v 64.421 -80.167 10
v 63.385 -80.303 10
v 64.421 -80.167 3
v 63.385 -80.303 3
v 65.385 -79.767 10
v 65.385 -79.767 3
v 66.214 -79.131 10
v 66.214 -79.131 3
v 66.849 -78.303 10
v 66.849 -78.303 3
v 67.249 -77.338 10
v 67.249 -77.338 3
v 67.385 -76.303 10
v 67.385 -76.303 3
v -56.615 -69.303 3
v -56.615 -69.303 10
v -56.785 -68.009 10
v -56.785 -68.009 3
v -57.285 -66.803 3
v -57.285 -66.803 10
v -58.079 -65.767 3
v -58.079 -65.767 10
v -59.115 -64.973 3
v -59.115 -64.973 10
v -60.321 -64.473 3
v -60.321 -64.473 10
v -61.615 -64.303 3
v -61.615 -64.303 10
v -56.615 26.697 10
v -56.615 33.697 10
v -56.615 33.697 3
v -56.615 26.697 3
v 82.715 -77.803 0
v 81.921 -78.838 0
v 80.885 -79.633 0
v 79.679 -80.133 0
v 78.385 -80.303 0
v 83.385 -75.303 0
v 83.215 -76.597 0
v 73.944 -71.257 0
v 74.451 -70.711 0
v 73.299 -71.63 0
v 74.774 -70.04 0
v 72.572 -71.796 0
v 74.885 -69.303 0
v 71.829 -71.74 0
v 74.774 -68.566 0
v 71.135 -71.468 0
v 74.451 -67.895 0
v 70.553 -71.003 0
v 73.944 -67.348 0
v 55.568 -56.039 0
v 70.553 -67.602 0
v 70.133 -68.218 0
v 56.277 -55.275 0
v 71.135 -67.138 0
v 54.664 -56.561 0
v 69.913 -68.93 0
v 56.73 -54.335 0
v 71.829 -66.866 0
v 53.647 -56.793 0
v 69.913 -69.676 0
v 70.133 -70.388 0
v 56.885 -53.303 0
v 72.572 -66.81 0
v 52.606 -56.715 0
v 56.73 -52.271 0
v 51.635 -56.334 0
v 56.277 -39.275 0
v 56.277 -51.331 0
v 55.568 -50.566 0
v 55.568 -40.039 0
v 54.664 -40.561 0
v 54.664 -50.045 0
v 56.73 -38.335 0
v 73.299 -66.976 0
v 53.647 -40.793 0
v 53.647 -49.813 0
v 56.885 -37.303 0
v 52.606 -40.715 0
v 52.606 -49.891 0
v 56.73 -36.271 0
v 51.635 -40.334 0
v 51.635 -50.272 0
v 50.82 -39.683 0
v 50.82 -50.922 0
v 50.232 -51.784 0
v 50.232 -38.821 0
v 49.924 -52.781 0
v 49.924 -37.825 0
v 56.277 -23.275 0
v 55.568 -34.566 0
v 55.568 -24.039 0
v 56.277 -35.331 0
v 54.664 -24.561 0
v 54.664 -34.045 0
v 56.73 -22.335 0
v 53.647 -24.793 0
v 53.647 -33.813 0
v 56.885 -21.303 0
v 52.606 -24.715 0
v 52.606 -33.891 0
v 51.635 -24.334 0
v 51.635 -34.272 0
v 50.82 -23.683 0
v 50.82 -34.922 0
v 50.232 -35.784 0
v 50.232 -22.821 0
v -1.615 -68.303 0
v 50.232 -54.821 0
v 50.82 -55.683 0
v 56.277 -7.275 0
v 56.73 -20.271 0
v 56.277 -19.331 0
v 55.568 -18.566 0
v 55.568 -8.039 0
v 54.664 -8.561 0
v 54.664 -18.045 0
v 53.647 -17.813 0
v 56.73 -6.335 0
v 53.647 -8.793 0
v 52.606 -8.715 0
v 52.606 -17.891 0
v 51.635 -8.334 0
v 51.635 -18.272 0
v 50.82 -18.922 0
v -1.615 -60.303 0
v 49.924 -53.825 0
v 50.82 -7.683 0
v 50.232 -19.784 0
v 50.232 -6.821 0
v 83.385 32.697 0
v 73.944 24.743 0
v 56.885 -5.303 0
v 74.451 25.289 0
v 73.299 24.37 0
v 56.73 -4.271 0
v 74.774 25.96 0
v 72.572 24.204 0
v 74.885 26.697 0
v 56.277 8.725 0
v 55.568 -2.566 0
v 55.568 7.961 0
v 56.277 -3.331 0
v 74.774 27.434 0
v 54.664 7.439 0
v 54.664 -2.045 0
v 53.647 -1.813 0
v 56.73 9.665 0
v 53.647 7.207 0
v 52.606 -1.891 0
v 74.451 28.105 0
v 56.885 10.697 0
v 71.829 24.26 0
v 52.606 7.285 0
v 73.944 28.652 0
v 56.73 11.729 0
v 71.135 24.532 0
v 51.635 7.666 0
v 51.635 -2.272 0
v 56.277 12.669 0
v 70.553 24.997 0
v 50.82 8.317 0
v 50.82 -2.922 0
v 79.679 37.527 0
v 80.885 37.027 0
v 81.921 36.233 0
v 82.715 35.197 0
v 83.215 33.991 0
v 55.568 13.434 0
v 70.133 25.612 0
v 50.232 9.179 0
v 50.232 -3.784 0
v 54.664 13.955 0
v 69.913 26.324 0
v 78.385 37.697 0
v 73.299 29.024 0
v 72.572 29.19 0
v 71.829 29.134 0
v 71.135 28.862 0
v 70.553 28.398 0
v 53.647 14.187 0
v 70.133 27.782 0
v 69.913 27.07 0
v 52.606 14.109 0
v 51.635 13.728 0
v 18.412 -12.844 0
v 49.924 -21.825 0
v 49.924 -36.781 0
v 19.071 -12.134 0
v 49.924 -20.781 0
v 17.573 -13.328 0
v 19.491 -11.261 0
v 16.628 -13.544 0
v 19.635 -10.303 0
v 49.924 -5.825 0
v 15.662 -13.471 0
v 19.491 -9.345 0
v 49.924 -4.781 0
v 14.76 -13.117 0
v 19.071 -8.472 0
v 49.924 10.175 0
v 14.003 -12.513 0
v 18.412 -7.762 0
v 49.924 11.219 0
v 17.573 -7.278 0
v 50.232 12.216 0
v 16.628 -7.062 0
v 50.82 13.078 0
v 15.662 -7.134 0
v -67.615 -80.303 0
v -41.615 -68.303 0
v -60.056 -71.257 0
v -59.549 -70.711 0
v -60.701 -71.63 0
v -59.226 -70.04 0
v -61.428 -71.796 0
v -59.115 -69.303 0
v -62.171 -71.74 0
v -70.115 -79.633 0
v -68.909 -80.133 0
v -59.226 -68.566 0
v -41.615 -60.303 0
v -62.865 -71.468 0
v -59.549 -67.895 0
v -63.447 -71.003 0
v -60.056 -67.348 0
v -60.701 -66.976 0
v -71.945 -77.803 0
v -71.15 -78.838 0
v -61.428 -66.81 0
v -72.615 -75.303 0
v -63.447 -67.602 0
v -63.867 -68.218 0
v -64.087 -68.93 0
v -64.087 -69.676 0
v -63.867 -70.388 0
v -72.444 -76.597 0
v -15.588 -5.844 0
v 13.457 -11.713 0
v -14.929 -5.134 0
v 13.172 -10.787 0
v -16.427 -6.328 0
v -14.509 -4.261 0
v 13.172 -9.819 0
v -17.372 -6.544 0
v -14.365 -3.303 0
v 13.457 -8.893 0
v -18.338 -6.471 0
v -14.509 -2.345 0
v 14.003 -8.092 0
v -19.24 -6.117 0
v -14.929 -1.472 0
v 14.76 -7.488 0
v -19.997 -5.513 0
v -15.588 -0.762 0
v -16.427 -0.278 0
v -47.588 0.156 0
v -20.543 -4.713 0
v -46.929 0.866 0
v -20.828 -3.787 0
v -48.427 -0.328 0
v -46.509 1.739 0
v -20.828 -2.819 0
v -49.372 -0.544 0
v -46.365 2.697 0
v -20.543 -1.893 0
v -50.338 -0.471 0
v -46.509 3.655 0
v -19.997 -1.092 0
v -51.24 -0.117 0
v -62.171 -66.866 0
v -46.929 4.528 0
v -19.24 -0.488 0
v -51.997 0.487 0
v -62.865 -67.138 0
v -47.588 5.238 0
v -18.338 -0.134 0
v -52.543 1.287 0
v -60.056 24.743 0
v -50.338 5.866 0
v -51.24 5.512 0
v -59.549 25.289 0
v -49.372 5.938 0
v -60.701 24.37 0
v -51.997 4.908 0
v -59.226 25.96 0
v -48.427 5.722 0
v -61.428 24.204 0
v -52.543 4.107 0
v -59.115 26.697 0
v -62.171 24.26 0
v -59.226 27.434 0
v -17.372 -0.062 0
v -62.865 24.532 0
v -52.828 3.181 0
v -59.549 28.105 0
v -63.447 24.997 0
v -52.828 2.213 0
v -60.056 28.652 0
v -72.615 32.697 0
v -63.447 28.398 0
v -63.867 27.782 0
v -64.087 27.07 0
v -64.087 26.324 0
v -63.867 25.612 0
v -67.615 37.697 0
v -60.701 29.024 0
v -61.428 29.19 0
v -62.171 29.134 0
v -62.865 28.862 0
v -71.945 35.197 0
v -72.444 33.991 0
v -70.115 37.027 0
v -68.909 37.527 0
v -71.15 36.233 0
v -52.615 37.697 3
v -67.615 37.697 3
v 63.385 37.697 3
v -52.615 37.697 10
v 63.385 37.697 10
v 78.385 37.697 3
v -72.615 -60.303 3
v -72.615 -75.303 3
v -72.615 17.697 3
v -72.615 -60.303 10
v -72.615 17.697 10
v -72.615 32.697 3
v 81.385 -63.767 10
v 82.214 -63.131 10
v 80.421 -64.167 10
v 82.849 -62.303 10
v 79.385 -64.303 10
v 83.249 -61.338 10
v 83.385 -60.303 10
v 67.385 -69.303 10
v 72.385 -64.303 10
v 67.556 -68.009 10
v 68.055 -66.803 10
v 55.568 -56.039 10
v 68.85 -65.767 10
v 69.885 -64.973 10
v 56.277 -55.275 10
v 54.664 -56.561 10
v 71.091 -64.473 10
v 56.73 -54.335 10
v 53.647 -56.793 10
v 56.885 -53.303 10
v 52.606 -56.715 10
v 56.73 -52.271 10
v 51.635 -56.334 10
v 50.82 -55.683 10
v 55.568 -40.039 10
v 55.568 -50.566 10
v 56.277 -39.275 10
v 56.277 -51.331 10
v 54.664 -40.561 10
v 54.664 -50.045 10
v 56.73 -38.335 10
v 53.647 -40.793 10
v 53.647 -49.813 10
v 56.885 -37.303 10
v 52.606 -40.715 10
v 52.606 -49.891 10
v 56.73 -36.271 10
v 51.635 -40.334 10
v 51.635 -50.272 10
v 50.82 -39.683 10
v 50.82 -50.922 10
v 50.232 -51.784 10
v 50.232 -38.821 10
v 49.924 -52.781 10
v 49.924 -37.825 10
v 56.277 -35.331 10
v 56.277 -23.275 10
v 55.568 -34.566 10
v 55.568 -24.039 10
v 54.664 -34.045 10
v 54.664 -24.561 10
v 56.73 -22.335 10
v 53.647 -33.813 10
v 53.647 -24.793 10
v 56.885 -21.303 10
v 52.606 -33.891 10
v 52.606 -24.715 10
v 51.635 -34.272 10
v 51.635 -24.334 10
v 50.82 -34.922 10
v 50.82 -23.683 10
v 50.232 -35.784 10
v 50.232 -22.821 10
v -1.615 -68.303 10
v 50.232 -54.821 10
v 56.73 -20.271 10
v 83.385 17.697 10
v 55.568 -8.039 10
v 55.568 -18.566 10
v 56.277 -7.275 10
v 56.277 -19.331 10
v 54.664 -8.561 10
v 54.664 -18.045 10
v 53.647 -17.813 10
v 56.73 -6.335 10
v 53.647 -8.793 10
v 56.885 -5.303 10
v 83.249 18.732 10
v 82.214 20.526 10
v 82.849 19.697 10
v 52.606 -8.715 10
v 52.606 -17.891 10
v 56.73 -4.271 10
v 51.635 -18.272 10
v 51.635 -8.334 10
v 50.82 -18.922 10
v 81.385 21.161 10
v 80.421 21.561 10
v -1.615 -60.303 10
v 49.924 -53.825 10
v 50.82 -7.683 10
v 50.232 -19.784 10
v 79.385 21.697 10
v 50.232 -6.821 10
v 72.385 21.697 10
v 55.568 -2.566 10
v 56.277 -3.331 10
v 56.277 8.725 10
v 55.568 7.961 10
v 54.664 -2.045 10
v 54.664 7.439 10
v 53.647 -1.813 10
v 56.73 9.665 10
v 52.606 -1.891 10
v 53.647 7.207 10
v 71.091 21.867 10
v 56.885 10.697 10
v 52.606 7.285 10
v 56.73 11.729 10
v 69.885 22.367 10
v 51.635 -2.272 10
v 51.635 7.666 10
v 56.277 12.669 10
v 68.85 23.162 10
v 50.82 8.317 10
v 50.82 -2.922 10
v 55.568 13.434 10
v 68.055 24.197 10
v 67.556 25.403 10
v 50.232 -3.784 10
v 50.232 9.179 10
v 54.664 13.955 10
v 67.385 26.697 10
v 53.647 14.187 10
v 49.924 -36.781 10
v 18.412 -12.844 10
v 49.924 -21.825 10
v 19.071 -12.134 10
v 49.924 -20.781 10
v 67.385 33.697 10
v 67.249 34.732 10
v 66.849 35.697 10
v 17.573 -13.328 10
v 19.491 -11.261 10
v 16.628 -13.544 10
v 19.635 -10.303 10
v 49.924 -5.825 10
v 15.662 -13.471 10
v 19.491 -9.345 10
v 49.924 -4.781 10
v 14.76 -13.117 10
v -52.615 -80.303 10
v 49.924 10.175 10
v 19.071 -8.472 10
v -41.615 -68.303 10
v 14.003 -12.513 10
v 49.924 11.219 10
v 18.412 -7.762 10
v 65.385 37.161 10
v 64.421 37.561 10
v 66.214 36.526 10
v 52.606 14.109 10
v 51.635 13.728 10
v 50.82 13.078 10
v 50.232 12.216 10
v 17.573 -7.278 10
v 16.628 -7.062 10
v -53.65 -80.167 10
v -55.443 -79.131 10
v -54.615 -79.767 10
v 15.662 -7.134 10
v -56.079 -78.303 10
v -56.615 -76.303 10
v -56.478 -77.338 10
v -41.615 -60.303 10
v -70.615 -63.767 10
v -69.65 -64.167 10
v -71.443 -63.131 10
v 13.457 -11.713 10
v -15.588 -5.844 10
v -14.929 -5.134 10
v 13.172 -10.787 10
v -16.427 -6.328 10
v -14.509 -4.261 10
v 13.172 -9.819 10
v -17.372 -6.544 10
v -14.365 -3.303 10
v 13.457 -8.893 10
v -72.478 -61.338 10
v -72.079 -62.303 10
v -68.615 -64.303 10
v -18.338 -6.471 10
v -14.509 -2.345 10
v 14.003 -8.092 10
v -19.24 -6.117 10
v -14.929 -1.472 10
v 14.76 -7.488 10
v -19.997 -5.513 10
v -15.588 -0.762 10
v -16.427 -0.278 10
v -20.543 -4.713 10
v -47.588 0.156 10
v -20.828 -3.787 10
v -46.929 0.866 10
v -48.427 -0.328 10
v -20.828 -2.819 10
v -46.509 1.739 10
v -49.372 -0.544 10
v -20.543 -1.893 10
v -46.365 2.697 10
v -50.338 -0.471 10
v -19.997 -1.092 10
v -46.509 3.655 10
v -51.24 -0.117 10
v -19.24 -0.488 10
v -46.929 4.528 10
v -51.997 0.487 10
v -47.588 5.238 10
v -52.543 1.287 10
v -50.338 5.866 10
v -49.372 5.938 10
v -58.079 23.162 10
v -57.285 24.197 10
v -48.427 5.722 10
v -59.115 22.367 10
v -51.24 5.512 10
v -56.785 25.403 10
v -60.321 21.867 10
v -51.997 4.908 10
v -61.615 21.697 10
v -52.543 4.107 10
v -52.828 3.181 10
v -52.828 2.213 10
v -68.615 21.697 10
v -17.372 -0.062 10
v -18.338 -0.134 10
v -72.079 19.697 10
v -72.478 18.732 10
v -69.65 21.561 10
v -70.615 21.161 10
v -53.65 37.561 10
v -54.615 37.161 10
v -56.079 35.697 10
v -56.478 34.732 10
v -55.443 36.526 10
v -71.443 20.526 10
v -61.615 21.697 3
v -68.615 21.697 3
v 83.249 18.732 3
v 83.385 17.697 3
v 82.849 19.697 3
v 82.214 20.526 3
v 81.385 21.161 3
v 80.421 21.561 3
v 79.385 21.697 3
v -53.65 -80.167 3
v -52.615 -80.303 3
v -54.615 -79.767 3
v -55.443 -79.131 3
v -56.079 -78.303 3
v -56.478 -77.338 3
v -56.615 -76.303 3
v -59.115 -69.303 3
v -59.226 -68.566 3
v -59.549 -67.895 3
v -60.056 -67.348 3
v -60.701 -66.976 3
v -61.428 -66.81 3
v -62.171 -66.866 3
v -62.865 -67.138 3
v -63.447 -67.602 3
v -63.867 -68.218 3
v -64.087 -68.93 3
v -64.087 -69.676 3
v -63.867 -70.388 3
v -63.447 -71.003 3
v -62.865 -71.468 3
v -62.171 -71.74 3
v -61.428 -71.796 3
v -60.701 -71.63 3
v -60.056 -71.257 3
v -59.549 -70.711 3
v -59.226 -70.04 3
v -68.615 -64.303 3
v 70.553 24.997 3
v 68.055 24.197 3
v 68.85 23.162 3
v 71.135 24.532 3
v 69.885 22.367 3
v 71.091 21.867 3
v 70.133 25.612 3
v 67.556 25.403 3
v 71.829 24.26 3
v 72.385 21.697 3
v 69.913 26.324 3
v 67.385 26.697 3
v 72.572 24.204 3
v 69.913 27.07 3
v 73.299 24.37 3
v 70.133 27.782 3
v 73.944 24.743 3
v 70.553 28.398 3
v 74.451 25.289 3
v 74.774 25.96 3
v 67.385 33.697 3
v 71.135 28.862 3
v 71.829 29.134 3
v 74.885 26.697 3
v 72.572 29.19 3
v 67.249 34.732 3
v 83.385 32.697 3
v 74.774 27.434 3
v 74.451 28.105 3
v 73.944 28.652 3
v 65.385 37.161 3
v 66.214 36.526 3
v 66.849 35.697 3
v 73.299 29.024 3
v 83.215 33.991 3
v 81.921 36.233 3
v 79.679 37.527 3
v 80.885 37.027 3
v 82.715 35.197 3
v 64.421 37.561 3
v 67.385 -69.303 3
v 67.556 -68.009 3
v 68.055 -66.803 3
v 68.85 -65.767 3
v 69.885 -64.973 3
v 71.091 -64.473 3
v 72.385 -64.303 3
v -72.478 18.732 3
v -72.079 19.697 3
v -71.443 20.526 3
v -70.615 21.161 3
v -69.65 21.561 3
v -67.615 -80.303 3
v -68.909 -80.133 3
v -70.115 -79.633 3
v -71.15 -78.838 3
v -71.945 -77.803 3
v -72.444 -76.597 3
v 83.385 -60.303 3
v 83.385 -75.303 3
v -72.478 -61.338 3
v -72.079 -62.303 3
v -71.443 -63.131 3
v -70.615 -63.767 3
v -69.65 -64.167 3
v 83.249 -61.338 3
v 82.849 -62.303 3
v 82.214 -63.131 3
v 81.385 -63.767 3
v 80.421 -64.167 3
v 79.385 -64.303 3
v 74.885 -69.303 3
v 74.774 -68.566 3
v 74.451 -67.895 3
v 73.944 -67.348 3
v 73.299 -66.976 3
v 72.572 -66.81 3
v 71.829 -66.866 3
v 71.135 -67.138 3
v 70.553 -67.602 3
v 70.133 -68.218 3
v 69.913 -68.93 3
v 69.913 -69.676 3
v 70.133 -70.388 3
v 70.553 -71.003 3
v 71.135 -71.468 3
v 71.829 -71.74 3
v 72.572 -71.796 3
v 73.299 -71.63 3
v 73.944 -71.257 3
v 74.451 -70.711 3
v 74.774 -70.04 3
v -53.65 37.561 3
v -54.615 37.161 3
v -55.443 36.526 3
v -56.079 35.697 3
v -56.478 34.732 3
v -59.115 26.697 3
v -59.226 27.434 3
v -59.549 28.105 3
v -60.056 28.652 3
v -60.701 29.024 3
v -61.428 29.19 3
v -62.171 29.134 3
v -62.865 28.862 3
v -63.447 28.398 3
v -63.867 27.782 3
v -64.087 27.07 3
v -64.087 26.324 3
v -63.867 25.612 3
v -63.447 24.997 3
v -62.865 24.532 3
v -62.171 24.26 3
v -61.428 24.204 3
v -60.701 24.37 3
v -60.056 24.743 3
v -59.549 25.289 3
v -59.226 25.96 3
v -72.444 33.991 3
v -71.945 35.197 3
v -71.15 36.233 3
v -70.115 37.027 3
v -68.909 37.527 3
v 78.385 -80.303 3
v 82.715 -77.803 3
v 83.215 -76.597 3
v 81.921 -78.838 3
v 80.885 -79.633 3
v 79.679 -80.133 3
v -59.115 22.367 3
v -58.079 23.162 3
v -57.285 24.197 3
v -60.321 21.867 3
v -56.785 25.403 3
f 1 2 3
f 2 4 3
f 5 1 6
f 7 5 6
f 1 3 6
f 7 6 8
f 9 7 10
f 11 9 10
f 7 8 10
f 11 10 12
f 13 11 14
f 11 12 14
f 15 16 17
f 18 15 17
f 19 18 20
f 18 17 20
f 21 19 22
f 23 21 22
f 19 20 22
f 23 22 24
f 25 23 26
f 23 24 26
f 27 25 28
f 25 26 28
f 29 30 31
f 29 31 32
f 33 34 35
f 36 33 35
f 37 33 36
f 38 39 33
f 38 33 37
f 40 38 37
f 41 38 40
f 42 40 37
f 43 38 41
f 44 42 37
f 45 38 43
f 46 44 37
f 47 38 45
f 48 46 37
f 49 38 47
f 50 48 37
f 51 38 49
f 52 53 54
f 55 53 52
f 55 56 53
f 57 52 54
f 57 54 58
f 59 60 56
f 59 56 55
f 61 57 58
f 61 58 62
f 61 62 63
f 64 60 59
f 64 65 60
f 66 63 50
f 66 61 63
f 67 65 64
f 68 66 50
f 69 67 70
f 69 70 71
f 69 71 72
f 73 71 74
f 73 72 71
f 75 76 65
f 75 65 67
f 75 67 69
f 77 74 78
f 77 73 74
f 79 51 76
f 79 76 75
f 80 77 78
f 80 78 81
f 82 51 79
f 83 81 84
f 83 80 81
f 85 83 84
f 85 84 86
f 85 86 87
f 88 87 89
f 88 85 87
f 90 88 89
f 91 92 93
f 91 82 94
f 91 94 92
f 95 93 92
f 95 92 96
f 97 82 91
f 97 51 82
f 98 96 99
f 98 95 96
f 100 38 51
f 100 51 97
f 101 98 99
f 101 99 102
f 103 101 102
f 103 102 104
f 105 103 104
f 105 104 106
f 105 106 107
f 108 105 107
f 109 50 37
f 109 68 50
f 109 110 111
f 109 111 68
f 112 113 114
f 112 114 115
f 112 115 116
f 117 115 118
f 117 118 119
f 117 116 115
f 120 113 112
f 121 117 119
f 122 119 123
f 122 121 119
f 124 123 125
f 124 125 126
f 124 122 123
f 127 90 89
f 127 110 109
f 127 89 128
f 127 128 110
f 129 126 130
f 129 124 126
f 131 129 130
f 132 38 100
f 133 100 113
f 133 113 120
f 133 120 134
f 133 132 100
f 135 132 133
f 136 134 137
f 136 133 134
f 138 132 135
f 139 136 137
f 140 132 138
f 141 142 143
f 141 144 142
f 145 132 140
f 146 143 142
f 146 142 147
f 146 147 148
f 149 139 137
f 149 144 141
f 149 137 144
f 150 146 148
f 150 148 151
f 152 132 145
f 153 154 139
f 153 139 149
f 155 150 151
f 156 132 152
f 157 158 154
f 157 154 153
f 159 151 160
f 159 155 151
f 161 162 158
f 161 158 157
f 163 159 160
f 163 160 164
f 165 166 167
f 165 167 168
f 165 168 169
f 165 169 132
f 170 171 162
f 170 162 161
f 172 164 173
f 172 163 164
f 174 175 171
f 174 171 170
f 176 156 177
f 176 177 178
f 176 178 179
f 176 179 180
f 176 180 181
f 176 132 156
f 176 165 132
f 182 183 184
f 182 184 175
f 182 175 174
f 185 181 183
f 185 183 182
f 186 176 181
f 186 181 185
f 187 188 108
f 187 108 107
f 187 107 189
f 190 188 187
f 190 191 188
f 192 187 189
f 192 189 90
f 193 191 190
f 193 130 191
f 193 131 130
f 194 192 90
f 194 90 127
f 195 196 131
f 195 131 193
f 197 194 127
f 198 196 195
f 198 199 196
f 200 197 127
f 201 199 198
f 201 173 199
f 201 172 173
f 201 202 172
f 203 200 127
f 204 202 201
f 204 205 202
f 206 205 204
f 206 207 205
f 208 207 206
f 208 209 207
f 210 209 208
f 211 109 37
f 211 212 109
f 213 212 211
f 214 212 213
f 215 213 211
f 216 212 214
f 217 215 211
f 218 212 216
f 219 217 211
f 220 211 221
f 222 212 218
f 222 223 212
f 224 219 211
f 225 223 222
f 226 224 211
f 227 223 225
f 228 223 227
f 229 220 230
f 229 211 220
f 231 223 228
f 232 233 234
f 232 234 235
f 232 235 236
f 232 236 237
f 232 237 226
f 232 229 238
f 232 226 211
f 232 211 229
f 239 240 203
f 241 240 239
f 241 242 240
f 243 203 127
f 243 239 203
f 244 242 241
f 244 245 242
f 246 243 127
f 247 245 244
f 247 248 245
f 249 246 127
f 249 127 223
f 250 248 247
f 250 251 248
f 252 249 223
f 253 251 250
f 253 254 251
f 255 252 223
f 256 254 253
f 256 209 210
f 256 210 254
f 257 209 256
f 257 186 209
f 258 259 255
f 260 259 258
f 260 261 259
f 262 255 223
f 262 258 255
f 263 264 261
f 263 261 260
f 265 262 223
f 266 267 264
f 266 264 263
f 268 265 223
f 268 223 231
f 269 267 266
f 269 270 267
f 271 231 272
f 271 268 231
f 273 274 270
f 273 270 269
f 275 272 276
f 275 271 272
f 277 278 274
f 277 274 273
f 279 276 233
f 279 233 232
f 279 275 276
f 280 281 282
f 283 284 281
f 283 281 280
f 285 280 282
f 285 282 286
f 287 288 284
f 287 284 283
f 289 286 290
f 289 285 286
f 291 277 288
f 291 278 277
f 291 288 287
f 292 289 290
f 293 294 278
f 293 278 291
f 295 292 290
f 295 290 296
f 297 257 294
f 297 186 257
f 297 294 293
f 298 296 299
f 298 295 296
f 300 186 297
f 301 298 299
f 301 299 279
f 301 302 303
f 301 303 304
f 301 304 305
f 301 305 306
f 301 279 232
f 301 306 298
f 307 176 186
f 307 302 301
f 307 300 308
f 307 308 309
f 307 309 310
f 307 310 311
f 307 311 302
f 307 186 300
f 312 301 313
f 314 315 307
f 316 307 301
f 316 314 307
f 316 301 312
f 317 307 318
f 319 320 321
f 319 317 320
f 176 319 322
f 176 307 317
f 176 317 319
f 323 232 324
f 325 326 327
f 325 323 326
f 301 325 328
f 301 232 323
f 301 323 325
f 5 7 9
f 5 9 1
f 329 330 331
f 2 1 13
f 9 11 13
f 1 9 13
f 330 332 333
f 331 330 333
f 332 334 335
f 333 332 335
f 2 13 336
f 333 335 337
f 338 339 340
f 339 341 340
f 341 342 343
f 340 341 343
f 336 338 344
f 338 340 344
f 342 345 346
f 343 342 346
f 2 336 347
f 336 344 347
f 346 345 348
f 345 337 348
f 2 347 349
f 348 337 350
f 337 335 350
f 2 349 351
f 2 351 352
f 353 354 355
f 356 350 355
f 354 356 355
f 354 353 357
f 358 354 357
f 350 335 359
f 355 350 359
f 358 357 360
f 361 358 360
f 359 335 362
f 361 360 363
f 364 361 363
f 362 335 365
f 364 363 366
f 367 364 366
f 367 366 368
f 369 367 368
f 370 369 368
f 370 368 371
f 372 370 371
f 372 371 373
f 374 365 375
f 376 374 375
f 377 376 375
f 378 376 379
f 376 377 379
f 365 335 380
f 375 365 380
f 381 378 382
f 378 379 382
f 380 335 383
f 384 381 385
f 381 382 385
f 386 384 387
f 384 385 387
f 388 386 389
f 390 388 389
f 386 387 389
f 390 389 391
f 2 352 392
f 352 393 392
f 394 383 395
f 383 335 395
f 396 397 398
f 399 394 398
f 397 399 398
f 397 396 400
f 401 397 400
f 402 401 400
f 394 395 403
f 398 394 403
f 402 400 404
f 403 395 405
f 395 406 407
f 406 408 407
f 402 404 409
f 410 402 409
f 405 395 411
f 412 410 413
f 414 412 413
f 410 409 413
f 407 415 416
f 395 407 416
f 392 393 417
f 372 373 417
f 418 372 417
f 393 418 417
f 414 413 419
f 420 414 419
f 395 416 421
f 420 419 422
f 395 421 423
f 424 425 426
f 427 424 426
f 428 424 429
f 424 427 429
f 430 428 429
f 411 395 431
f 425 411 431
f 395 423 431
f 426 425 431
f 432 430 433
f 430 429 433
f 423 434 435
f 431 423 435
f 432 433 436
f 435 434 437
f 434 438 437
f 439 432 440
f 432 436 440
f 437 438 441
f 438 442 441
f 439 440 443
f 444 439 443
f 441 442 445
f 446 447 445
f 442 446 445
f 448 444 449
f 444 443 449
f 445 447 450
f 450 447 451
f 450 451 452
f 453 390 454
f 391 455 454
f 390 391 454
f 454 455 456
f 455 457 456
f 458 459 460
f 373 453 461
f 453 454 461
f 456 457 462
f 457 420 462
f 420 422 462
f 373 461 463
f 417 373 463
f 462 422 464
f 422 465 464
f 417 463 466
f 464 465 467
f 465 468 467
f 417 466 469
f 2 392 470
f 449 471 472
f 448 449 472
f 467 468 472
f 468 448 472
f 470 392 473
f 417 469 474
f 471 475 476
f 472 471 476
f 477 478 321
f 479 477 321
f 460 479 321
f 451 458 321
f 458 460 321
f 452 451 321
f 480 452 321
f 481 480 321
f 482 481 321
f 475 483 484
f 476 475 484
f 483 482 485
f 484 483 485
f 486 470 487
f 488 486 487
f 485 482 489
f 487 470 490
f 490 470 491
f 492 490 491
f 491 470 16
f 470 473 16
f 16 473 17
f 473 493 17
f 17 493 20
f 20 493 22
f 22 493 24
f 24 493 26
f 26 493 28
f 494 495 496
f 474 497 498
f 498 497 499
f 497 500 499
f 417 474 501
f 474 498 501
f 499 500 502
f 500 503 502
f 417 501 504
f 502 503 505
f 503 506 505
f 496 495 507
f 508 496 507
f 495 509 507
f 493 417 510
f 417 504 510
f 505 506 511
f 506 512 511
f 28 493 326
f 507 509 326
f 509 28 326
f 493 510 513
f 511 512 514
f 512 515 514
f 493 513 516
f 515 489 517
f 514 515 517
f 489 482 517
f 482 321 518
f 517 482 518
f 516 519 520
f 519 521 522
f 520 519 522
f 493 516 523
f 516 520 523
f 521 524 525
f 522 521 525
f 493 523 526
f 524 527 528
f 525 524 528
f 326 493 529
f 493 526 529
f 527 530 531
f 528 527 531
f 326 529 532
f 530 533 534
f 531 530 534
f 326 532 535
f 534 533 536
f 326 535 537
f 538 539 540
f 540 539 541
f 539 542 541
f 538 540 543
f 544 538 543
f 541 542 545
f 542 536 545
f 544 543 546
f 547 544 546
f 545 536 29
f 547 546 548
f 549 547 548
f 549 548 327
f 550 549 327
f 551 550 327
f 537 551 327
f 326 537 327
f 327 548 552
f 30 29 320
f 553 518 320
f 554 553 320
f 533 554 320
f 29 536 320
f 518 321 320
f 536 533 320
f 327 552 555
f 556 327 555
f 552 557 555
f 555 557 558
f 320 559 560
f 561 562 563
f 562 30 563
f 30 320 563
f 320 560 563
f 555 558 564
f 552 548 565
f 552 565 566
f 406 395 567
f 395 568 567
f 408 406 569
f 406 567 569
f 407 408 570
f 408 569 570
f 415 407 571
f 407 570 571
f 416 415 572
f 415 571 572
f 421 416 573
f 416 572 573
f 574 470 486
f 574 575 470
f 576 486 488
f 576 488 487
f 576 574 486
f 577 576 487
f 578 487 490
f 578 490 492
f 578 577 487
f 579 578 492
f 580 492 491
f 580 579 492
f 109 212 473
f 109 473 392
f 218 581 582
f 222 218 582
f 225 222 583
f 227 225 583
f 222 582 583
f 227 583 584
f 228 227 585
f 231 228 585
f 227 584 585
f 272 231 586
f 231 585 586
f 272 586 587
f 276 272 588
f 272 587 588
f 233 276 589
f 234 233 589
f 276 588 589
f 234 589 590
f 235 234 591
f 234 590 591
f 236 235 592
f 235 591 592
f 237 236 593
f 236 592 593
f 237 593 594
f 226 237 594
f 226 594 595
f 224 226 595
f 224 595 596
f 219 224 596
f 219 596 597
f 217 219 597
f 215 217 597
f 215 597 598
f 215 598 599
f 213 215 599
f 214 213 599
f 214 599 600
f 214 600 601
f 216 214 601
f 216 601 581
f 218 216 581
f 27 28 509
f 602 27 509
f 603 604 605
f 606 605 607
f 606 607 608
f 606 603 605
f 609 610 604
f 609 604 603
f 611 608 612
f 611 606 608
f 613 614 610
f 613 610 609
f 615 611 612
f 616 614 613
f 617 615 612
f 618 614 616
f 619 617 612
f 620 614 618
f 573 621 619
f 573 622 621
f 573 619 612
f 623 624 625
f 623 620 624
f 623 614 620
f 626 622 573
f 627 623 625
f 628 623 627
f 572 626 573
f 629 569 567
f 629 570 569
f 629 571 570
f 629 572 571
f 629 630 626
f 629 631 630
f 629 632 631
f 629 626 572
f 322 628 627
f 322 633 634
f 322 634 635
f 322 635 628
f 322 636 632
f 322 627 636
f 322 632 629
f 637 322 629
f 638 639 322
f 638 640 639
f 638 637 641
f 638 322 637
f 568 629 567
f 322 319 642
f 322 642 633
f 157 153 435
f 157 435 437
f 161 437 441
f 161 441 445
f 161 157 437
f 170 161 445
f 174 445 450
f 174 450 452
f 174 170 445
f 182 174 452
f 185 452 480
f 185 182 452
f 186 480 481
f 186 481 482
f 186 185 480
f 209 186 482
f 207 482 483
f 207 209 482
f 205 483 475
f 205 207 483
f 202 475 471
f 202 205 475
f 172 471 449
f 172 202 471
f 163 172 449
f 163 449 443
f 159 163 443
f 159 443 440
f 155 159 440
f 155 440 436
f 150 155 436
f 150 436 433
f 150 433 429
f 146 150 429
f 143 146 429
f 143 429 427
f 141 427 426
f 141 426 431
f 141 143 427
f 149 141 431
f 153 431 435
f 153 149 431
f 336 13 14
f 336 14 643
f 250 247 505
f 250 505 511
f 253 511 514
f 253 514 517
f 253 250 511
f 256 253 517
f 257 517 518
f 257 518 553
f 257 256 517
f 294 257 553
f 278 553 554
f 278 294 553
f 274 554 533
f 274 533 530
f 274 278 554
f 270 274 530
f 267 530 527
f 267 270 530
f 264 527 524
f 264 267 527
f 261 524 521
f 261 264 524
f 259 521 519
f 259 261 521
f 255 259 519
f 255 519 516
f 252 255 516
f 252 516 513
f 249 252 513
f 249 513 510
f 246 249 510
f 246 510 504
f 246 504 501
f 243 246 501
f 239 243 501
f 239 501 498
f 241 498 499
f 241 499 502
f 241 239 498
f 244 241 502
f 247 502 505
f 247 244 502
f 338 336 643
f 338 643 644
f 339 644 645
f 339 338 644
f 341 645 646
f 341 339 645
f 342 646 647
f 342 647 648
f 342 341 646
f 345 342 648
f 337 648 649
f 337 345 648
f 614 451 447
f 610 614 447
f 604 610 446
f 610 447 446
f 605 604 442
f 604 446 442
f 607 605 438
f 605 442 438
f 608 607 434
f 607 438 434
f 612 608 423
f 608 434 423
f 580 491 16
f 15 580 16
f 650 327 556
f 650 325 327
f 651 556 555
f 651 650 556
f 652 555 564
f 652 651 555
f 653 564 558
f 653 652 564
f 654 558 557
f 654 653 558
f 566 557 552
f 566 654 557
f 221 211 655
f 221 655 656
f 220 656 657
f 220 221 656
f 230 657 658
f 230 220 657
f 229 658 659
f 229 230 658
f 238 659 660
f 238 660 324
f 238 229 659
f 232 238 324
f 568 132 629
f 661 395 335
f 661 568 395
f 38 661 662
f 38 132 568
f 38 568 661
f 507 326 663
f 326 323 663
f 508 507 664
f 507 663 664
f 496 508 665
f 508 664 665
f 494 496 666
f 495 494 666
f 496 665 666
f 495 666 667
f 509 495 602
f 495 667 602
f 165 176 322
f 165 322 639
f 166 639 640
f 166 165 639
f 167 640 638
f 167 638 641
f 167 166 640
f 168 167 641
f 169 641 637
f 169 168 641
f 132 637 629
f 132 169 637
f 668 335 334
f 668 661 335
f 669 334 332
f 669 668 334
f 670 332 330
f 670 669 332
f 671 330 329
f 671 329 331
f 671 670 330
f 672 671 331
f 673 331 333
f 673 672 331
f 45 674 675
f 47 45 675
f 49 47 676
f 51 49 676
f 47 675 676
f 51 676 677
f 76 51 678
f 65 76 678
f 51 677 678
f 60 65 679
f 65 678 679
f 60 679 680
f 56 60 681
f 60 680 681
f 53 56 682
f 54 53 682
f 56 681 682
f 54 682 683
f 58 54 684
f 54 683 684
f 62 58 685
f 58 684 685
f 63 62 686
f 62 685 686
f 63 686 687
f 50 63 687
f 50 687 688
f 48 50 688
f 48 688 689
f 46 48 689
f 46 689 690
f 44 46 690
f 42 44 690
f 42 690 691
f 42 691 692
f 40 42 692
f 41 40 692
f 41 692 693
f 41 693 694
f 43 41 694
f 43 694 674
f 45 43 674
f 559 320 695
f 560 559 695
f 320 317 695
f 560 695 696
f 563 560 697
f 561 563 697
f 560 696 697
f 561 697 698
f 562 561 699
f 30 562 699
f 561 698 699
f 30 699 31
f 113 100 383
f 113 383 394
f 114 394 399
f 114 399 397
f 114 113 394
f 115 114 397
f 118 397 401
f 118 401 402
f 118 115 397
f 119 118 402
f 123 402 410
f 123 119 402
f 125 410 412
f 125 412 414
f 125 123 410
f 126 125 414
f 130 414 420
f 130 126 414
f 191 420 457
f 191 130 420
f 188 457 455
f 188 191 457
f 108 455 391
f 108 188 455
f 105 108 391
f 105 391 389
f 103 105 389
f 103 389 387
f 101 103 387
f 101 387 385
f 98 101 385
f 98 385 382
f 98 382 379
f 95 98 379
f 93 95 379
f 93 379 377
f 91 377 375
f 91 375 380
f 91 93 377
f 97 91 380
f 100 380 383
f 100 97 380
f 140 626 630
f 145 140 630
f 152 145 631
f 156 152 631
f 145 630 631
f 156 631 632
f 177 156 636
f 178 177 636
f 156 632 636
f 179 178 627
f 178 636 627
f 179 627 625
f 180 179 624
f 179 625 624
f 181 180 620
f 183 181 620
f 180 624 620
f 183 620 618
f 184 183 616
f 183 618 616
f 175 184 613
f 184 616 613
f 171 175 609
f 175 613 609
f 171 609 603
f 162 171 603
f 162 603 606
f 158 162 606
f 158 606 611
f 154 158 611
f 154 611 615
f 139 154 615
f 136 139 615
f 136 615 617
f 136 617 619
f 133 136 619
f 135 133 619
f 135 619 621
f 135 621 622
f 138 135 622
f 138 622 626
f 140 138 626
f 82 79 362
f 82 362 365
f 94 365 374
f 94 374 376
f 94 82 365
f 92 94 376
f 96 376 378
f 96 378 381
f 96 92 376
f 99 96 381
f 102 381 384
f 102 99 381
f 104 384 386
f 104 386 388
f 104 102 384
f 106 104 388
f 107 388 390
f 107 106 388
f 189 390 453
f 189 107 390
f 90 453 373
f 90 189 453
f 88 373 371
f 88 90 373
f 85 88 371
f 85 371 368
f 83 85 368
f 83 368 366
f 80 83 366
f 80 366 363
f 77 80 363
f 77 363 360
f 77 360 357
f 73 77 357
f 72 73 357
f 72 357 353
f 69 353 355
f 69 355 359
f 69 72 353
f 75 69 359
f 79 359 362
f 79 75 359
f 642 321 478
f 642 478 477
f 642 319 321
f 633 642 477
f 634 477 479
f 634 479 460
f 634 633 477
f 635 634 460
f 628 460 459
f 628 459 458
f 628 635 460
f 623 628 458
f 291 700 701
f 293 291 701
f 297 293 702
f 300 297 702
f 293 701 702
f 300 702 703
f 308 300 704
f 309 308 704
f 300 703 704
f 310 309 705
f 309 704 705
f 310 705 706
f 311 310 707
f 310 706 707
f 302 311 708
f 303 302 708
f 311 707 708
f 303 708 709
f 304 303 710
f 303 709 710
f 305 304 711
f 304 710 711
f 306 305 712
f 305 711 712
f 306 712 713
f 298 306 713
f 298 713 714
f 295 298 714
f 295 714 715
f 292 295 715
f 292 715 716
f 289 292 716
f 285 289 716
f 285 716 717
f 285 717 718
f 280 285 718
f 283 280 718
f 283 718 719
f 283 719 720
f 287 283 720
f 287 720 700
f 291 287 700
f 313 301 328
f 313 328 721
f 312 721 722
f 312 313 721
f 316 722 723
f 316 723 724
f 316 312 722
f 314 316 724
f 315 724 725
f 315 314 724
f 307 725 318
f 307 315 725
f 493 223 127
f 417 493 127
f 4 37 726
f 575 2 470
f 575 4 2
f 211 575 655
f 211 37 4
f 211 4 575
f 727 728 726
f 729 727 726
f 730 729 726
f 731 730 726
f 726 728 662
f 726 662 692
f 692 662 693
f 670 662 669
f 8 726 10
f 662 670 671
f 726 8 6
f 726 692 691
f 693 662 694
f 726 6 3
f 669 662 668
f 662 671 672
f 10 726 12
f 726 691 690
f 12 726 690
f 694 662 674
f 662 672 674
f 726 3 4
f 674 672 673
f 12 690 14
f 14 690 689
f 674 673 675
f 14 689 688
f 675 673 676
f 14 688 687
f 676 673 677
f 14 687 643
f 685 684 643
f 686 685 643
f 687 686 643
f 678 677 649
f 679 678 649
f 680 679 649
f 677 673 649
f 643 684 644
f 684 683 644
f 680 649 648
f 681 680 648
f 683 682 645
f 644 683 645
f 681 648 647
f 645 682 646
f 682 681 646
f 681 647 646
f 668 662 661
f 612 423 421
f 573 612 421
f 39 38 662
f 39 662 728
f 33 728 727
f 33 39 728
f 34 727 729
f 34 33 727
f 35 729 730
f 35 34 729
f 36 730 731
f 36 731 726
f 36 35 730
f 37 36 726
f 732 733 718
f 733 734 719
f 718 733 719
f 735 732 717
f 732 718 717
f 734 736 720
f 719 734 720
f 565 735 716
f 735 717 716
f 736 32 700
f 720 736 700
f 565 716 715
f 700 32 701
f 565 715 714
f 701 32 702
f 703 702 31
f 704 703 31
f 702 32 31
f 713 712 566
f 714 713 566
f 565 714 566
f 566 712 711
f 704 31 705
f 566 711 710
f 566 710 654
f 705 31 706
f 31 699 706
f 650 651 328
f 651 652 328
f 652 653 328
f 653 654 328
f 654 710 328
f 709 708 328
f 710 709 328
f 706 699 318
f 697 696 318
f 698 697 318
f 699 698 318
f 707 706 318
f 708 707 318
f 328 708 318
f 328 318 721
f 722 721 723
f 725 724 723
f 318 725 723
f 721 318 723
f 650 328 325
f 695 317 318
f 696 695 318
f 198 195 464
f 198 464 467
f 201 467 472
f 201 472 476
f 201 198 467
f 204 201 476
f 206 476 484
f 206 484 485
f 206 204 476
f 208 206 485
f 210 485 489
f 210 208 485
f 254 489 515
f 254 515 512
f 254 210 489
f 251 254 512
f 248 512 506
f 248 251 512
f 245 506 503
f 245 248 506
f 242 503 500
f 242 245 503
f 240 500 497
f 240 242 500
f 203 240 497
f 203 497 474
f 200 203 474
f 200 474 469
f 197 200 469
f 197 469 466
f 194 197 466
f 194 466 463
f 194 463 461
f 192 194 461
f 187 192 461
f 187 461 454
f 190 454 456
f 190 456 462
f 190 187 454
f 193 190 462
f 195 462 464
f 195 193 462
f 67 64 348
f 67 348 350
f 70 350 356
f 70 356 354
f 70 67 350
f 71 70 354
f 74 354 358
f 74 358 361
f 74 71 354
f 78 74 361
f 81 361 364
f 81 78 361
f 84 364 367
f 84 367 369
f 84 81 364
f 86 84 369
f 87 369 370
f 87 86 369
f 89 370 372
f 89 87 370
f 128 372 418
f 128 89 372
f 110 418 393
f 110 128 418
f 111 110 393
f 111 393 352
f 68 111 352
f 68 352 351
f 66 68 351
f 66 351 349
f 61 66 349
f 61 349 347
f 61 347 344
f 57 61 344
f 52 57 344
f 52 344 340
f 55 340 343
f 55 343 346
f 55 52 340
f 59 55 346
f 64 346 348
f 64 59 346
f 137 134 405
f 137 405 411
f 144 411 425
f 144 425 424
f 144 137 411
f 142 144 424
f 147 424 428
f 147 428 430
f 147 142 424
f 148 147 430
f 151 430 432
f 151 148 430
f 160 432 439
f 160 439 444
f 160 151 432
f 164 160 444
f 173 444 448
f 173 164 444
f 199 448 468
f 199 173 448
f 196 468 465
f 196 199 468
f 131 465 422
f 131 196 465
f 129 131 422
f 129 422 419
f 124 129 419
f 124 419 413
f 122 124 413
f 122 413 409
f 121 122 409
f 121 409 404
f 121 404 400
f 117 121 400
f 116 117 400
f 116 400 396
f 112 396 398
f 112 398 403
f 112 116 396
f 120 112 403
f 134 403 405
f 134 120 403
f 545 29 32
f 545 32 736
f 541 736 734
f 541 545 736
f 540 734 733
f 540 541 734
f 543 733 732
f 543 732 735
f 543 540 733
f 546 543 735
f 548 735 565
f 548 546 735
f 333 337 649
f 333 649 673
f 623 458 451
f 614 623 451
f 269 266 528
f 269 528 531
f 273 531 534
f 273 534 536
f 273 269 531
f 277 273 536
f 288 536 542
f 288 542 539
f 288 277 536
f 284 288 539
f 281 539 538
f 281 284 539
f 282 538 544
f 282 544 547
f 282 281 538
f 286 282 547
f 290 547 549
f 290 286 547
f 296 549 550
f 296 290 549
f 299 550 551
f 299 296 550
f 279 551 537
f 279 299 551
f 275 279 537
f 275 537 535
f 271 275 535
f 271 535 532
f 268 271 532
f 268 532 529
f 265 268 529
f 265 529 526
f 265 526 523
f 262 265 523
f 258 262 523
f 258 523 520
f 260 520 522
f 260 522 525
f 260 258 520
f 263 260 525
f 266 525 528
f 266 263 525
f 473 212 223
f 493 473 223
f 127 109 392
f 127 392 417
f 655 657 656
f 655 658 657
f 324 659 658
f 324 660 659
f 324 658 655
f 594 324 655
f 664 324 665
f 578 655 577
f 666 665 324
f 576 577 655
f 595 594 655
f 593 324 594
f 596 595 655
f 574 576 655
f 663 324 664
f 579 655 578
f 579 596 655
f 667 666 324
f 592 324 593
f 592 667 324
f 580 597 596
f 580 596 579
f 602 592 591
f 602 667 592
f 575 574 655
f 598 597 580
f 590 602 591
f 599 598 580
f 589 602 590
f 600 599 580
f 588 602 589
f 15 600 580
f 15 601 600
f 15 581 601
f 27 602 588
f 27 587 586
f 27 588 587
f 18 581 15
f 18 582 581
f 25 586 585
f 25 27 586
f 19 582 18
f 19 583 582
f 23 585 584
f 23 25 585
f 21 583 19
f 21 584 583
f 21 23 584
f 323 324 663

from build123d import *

# Parameters (mm, degrees)
SKETCH1_R           = 3.25
SKETCH1_R_2         = 3.5
SKETCH1_W           = 40
SKETCH1_H           = 8
BOSS_EXTRUDE1_DEPTH = 10
CUT_EXTRUDE1_DEPTH  = 7
SKETCH3_R           = 2.5
CUT_EXTRUDE2_DEPTH  = 10
FILLET1_R           = 4


with BuildPart() as part:
    # Sketch1 → Boss-Extrude1 (new body)
    with BuildSketch(Plane.XY):
        with BuildLine():
            Line((-67.614699332, 37.697104677), (78.385300668, 37.697104677))
            ThreePointArc((78.385300668, 37.697104677), (81.920834574, 36.232638583), (83.385300668, 32.697104677))
            Line((83.385300668, 32.697104677), (83.385300668, -75.302895323))
            ThreePointArc((83.385300668, -75.302895323), (81.920834574, -78.838429229), (78.385300668, -80.302895323))
            Line((78.385300668, -80.302895323), (-67.614699332, -80.302895323))
            ThreePointArc((-67.614699332, -80.302895323), (-71.150233238, -78.838429229), (-72.614699332, -75.302895323))
            Line((-72.614699332, -75.302895323), (-72.614699332, 32.697104677))
            ThreePointArc((-72.614699332, 32.697104677), (-71.150233238, 36.232638583), (-67.614699332, 37.697104677))
        make_face()
        with Locations((-49.614699332, 2.697104677)):
            Circle(SKETCH1_R, mode=Mode.SUBTRACT)
        with Locations((-17.614699332, -3.302895323)):
            Circle(SKETCH1_R, mode=Mode.SUBTRACT)
        with Locations((16.385300668, -10.302895323)):
            Circle(SKETCH1_R, mode=Mode.SUBTRACT)
        with Locations((53.385300668, 10.697104677)):
            Circle(SKETCH1_R_2, mode=Mode.SUBTRACT)
        with Locations((53.385300668, -5.302895323)):
            Circle(SKETCH1_R_2, mode=Mode.SUBTRACT)
        with Locations((53.385300668, -21.302895323)):
            Circle(SKETCH1_R_2, mode=Mode.SUBTRACT)
        with Locations((53.385300668, -37.302895323)):
            Circle(SKETCH1_R_2, mode=Mode.SUBTRACT)
        with Locations((53.385300668, -53.302895323)):
            Circle(SKETCH1_R_2, mode=Mode.SUBTRACT)
        with Locations((-21.614699332, -64.302895323)):
            Rectangle(SKETCH1_W, SKETCH1_H, mode=Mode.SUBTRACT)
    extrude(amount=BOSS_EXTRUDE1_DEPTH)

    # Sketch2 → Cut-Extrude1 (cut)
    with BuildSketch(Plane.XY.offset(10)):
        with BuildLine():
            Line((-72.614699332, 37.697104677), (-56.614699332, 37.697104677))
            Line((-56.614699332, 37.697104677), (-56.614699332, 26.697104677))
            ThreePointArc((-56.614699332, 26.697104677), (-58.079165426, 23.161570771), (-61.614699332, 21.697104677))
            Line((-61.614699332, 21.697104677), (-72.614699332, 21.697104677))
            Line((-72.614699332, 21.697104677), (-72.614699332, 37.697104677))
        make_face()
        with BuildLine():
            Line((83.385300668, 37.697104677), (67.385300668, 37.697104677))
            Line((67.385300668, 37.697104677), (67.385300668, 26.697104677))
            ThreePointArc((67.385300668, 26.697104677), (68.849766762, 23.161570771), (72.385300668, 21.697104677))
            Line((72.385300668, 21.697104677), (83.385300668, 21.697104677))
            Line((83.385300668, 21.697104677), (83.385300668, 37.697104677))
        make_face()
        with BuildLine():
            Line((83.385300668, -80.302895323), (67.385300668, -80.302895323))
            Line((67.385300668, -80.302895323), (67.385300668, -69.302895323))
            ThreePointArc((67.385300668, -69.302895323), (68.849766762, -65.767361417), (72.385300668, -64.302895323))
            Line((72.385300668, -64.302895323), (83.385300668, -64.302895323))
            Line((83.385300668, -64.302895323), (83.385300668, -80.302895323))
        make_face()
        with BuildLine():
            Line((-72.614699332, -80.302895323), (-56.614699332, -80.302895323))
            Line((-56.614699332, -80.302895323), (-56.614699332, -69.302895323))
            ThreePointArc((-56.614699332, -69.302895323), (-58.079165426, -65.767361417), (-61.614699332, -64.302895323))
            Line((-61.614699332, -64.302895323), (-72.614699332, -64.302895323))
            Line((-72.614699332, -64.302895323), (-72.614699332, -80.302895323))
        make_face()
    extrude(amount=-CUT_EXTRUDE1_DEPTH, mode=Mode.SUBTRACT)

    # Sketch3 → Cut-Extrude2 (cut)
    with BuildSketch(Plane.XY.offset(3)):
        with Locations((-61.614699332, 26.697104677)):
            Circle(SKETCH3_R)
        with Locations((72.385300668, 26.697104677)):
            Circle(SKETCH3_R)
        with Locations((72.385300668, -69.302895323)):
            Circle(SKETCH3_R)
        with Locations((-61.614699332, -69.302895323)):
            Circle(SKETCH3_R)
    extrude(amount=-CUT_EXTRUDE2_DEPTH, mode=Mode.SUBTRACT)

    # Fillet1
    fillet1_edges = [part.edges().sort_by_distance(p)[0] for p in [
        (83.385300668, -64.302895323, 6.5),
        (67.385300668, -80.302895323, 6.5),
        (67.385300668, 37.697104677, 6.5),
        (83.385300668, 21.697104677, 6.5),
        (-72.614699332, 21.697104677, 6.5),
        (-56.614699332, 37.697104677, 6.5),
        (-56.614699332, -80.302895323, 6.5),
        (-72.614699332, -64.302895323, 6.5),
    ]]
    fillet(fillet1_edges, radius=FILLET1_R)


solid = part.part
